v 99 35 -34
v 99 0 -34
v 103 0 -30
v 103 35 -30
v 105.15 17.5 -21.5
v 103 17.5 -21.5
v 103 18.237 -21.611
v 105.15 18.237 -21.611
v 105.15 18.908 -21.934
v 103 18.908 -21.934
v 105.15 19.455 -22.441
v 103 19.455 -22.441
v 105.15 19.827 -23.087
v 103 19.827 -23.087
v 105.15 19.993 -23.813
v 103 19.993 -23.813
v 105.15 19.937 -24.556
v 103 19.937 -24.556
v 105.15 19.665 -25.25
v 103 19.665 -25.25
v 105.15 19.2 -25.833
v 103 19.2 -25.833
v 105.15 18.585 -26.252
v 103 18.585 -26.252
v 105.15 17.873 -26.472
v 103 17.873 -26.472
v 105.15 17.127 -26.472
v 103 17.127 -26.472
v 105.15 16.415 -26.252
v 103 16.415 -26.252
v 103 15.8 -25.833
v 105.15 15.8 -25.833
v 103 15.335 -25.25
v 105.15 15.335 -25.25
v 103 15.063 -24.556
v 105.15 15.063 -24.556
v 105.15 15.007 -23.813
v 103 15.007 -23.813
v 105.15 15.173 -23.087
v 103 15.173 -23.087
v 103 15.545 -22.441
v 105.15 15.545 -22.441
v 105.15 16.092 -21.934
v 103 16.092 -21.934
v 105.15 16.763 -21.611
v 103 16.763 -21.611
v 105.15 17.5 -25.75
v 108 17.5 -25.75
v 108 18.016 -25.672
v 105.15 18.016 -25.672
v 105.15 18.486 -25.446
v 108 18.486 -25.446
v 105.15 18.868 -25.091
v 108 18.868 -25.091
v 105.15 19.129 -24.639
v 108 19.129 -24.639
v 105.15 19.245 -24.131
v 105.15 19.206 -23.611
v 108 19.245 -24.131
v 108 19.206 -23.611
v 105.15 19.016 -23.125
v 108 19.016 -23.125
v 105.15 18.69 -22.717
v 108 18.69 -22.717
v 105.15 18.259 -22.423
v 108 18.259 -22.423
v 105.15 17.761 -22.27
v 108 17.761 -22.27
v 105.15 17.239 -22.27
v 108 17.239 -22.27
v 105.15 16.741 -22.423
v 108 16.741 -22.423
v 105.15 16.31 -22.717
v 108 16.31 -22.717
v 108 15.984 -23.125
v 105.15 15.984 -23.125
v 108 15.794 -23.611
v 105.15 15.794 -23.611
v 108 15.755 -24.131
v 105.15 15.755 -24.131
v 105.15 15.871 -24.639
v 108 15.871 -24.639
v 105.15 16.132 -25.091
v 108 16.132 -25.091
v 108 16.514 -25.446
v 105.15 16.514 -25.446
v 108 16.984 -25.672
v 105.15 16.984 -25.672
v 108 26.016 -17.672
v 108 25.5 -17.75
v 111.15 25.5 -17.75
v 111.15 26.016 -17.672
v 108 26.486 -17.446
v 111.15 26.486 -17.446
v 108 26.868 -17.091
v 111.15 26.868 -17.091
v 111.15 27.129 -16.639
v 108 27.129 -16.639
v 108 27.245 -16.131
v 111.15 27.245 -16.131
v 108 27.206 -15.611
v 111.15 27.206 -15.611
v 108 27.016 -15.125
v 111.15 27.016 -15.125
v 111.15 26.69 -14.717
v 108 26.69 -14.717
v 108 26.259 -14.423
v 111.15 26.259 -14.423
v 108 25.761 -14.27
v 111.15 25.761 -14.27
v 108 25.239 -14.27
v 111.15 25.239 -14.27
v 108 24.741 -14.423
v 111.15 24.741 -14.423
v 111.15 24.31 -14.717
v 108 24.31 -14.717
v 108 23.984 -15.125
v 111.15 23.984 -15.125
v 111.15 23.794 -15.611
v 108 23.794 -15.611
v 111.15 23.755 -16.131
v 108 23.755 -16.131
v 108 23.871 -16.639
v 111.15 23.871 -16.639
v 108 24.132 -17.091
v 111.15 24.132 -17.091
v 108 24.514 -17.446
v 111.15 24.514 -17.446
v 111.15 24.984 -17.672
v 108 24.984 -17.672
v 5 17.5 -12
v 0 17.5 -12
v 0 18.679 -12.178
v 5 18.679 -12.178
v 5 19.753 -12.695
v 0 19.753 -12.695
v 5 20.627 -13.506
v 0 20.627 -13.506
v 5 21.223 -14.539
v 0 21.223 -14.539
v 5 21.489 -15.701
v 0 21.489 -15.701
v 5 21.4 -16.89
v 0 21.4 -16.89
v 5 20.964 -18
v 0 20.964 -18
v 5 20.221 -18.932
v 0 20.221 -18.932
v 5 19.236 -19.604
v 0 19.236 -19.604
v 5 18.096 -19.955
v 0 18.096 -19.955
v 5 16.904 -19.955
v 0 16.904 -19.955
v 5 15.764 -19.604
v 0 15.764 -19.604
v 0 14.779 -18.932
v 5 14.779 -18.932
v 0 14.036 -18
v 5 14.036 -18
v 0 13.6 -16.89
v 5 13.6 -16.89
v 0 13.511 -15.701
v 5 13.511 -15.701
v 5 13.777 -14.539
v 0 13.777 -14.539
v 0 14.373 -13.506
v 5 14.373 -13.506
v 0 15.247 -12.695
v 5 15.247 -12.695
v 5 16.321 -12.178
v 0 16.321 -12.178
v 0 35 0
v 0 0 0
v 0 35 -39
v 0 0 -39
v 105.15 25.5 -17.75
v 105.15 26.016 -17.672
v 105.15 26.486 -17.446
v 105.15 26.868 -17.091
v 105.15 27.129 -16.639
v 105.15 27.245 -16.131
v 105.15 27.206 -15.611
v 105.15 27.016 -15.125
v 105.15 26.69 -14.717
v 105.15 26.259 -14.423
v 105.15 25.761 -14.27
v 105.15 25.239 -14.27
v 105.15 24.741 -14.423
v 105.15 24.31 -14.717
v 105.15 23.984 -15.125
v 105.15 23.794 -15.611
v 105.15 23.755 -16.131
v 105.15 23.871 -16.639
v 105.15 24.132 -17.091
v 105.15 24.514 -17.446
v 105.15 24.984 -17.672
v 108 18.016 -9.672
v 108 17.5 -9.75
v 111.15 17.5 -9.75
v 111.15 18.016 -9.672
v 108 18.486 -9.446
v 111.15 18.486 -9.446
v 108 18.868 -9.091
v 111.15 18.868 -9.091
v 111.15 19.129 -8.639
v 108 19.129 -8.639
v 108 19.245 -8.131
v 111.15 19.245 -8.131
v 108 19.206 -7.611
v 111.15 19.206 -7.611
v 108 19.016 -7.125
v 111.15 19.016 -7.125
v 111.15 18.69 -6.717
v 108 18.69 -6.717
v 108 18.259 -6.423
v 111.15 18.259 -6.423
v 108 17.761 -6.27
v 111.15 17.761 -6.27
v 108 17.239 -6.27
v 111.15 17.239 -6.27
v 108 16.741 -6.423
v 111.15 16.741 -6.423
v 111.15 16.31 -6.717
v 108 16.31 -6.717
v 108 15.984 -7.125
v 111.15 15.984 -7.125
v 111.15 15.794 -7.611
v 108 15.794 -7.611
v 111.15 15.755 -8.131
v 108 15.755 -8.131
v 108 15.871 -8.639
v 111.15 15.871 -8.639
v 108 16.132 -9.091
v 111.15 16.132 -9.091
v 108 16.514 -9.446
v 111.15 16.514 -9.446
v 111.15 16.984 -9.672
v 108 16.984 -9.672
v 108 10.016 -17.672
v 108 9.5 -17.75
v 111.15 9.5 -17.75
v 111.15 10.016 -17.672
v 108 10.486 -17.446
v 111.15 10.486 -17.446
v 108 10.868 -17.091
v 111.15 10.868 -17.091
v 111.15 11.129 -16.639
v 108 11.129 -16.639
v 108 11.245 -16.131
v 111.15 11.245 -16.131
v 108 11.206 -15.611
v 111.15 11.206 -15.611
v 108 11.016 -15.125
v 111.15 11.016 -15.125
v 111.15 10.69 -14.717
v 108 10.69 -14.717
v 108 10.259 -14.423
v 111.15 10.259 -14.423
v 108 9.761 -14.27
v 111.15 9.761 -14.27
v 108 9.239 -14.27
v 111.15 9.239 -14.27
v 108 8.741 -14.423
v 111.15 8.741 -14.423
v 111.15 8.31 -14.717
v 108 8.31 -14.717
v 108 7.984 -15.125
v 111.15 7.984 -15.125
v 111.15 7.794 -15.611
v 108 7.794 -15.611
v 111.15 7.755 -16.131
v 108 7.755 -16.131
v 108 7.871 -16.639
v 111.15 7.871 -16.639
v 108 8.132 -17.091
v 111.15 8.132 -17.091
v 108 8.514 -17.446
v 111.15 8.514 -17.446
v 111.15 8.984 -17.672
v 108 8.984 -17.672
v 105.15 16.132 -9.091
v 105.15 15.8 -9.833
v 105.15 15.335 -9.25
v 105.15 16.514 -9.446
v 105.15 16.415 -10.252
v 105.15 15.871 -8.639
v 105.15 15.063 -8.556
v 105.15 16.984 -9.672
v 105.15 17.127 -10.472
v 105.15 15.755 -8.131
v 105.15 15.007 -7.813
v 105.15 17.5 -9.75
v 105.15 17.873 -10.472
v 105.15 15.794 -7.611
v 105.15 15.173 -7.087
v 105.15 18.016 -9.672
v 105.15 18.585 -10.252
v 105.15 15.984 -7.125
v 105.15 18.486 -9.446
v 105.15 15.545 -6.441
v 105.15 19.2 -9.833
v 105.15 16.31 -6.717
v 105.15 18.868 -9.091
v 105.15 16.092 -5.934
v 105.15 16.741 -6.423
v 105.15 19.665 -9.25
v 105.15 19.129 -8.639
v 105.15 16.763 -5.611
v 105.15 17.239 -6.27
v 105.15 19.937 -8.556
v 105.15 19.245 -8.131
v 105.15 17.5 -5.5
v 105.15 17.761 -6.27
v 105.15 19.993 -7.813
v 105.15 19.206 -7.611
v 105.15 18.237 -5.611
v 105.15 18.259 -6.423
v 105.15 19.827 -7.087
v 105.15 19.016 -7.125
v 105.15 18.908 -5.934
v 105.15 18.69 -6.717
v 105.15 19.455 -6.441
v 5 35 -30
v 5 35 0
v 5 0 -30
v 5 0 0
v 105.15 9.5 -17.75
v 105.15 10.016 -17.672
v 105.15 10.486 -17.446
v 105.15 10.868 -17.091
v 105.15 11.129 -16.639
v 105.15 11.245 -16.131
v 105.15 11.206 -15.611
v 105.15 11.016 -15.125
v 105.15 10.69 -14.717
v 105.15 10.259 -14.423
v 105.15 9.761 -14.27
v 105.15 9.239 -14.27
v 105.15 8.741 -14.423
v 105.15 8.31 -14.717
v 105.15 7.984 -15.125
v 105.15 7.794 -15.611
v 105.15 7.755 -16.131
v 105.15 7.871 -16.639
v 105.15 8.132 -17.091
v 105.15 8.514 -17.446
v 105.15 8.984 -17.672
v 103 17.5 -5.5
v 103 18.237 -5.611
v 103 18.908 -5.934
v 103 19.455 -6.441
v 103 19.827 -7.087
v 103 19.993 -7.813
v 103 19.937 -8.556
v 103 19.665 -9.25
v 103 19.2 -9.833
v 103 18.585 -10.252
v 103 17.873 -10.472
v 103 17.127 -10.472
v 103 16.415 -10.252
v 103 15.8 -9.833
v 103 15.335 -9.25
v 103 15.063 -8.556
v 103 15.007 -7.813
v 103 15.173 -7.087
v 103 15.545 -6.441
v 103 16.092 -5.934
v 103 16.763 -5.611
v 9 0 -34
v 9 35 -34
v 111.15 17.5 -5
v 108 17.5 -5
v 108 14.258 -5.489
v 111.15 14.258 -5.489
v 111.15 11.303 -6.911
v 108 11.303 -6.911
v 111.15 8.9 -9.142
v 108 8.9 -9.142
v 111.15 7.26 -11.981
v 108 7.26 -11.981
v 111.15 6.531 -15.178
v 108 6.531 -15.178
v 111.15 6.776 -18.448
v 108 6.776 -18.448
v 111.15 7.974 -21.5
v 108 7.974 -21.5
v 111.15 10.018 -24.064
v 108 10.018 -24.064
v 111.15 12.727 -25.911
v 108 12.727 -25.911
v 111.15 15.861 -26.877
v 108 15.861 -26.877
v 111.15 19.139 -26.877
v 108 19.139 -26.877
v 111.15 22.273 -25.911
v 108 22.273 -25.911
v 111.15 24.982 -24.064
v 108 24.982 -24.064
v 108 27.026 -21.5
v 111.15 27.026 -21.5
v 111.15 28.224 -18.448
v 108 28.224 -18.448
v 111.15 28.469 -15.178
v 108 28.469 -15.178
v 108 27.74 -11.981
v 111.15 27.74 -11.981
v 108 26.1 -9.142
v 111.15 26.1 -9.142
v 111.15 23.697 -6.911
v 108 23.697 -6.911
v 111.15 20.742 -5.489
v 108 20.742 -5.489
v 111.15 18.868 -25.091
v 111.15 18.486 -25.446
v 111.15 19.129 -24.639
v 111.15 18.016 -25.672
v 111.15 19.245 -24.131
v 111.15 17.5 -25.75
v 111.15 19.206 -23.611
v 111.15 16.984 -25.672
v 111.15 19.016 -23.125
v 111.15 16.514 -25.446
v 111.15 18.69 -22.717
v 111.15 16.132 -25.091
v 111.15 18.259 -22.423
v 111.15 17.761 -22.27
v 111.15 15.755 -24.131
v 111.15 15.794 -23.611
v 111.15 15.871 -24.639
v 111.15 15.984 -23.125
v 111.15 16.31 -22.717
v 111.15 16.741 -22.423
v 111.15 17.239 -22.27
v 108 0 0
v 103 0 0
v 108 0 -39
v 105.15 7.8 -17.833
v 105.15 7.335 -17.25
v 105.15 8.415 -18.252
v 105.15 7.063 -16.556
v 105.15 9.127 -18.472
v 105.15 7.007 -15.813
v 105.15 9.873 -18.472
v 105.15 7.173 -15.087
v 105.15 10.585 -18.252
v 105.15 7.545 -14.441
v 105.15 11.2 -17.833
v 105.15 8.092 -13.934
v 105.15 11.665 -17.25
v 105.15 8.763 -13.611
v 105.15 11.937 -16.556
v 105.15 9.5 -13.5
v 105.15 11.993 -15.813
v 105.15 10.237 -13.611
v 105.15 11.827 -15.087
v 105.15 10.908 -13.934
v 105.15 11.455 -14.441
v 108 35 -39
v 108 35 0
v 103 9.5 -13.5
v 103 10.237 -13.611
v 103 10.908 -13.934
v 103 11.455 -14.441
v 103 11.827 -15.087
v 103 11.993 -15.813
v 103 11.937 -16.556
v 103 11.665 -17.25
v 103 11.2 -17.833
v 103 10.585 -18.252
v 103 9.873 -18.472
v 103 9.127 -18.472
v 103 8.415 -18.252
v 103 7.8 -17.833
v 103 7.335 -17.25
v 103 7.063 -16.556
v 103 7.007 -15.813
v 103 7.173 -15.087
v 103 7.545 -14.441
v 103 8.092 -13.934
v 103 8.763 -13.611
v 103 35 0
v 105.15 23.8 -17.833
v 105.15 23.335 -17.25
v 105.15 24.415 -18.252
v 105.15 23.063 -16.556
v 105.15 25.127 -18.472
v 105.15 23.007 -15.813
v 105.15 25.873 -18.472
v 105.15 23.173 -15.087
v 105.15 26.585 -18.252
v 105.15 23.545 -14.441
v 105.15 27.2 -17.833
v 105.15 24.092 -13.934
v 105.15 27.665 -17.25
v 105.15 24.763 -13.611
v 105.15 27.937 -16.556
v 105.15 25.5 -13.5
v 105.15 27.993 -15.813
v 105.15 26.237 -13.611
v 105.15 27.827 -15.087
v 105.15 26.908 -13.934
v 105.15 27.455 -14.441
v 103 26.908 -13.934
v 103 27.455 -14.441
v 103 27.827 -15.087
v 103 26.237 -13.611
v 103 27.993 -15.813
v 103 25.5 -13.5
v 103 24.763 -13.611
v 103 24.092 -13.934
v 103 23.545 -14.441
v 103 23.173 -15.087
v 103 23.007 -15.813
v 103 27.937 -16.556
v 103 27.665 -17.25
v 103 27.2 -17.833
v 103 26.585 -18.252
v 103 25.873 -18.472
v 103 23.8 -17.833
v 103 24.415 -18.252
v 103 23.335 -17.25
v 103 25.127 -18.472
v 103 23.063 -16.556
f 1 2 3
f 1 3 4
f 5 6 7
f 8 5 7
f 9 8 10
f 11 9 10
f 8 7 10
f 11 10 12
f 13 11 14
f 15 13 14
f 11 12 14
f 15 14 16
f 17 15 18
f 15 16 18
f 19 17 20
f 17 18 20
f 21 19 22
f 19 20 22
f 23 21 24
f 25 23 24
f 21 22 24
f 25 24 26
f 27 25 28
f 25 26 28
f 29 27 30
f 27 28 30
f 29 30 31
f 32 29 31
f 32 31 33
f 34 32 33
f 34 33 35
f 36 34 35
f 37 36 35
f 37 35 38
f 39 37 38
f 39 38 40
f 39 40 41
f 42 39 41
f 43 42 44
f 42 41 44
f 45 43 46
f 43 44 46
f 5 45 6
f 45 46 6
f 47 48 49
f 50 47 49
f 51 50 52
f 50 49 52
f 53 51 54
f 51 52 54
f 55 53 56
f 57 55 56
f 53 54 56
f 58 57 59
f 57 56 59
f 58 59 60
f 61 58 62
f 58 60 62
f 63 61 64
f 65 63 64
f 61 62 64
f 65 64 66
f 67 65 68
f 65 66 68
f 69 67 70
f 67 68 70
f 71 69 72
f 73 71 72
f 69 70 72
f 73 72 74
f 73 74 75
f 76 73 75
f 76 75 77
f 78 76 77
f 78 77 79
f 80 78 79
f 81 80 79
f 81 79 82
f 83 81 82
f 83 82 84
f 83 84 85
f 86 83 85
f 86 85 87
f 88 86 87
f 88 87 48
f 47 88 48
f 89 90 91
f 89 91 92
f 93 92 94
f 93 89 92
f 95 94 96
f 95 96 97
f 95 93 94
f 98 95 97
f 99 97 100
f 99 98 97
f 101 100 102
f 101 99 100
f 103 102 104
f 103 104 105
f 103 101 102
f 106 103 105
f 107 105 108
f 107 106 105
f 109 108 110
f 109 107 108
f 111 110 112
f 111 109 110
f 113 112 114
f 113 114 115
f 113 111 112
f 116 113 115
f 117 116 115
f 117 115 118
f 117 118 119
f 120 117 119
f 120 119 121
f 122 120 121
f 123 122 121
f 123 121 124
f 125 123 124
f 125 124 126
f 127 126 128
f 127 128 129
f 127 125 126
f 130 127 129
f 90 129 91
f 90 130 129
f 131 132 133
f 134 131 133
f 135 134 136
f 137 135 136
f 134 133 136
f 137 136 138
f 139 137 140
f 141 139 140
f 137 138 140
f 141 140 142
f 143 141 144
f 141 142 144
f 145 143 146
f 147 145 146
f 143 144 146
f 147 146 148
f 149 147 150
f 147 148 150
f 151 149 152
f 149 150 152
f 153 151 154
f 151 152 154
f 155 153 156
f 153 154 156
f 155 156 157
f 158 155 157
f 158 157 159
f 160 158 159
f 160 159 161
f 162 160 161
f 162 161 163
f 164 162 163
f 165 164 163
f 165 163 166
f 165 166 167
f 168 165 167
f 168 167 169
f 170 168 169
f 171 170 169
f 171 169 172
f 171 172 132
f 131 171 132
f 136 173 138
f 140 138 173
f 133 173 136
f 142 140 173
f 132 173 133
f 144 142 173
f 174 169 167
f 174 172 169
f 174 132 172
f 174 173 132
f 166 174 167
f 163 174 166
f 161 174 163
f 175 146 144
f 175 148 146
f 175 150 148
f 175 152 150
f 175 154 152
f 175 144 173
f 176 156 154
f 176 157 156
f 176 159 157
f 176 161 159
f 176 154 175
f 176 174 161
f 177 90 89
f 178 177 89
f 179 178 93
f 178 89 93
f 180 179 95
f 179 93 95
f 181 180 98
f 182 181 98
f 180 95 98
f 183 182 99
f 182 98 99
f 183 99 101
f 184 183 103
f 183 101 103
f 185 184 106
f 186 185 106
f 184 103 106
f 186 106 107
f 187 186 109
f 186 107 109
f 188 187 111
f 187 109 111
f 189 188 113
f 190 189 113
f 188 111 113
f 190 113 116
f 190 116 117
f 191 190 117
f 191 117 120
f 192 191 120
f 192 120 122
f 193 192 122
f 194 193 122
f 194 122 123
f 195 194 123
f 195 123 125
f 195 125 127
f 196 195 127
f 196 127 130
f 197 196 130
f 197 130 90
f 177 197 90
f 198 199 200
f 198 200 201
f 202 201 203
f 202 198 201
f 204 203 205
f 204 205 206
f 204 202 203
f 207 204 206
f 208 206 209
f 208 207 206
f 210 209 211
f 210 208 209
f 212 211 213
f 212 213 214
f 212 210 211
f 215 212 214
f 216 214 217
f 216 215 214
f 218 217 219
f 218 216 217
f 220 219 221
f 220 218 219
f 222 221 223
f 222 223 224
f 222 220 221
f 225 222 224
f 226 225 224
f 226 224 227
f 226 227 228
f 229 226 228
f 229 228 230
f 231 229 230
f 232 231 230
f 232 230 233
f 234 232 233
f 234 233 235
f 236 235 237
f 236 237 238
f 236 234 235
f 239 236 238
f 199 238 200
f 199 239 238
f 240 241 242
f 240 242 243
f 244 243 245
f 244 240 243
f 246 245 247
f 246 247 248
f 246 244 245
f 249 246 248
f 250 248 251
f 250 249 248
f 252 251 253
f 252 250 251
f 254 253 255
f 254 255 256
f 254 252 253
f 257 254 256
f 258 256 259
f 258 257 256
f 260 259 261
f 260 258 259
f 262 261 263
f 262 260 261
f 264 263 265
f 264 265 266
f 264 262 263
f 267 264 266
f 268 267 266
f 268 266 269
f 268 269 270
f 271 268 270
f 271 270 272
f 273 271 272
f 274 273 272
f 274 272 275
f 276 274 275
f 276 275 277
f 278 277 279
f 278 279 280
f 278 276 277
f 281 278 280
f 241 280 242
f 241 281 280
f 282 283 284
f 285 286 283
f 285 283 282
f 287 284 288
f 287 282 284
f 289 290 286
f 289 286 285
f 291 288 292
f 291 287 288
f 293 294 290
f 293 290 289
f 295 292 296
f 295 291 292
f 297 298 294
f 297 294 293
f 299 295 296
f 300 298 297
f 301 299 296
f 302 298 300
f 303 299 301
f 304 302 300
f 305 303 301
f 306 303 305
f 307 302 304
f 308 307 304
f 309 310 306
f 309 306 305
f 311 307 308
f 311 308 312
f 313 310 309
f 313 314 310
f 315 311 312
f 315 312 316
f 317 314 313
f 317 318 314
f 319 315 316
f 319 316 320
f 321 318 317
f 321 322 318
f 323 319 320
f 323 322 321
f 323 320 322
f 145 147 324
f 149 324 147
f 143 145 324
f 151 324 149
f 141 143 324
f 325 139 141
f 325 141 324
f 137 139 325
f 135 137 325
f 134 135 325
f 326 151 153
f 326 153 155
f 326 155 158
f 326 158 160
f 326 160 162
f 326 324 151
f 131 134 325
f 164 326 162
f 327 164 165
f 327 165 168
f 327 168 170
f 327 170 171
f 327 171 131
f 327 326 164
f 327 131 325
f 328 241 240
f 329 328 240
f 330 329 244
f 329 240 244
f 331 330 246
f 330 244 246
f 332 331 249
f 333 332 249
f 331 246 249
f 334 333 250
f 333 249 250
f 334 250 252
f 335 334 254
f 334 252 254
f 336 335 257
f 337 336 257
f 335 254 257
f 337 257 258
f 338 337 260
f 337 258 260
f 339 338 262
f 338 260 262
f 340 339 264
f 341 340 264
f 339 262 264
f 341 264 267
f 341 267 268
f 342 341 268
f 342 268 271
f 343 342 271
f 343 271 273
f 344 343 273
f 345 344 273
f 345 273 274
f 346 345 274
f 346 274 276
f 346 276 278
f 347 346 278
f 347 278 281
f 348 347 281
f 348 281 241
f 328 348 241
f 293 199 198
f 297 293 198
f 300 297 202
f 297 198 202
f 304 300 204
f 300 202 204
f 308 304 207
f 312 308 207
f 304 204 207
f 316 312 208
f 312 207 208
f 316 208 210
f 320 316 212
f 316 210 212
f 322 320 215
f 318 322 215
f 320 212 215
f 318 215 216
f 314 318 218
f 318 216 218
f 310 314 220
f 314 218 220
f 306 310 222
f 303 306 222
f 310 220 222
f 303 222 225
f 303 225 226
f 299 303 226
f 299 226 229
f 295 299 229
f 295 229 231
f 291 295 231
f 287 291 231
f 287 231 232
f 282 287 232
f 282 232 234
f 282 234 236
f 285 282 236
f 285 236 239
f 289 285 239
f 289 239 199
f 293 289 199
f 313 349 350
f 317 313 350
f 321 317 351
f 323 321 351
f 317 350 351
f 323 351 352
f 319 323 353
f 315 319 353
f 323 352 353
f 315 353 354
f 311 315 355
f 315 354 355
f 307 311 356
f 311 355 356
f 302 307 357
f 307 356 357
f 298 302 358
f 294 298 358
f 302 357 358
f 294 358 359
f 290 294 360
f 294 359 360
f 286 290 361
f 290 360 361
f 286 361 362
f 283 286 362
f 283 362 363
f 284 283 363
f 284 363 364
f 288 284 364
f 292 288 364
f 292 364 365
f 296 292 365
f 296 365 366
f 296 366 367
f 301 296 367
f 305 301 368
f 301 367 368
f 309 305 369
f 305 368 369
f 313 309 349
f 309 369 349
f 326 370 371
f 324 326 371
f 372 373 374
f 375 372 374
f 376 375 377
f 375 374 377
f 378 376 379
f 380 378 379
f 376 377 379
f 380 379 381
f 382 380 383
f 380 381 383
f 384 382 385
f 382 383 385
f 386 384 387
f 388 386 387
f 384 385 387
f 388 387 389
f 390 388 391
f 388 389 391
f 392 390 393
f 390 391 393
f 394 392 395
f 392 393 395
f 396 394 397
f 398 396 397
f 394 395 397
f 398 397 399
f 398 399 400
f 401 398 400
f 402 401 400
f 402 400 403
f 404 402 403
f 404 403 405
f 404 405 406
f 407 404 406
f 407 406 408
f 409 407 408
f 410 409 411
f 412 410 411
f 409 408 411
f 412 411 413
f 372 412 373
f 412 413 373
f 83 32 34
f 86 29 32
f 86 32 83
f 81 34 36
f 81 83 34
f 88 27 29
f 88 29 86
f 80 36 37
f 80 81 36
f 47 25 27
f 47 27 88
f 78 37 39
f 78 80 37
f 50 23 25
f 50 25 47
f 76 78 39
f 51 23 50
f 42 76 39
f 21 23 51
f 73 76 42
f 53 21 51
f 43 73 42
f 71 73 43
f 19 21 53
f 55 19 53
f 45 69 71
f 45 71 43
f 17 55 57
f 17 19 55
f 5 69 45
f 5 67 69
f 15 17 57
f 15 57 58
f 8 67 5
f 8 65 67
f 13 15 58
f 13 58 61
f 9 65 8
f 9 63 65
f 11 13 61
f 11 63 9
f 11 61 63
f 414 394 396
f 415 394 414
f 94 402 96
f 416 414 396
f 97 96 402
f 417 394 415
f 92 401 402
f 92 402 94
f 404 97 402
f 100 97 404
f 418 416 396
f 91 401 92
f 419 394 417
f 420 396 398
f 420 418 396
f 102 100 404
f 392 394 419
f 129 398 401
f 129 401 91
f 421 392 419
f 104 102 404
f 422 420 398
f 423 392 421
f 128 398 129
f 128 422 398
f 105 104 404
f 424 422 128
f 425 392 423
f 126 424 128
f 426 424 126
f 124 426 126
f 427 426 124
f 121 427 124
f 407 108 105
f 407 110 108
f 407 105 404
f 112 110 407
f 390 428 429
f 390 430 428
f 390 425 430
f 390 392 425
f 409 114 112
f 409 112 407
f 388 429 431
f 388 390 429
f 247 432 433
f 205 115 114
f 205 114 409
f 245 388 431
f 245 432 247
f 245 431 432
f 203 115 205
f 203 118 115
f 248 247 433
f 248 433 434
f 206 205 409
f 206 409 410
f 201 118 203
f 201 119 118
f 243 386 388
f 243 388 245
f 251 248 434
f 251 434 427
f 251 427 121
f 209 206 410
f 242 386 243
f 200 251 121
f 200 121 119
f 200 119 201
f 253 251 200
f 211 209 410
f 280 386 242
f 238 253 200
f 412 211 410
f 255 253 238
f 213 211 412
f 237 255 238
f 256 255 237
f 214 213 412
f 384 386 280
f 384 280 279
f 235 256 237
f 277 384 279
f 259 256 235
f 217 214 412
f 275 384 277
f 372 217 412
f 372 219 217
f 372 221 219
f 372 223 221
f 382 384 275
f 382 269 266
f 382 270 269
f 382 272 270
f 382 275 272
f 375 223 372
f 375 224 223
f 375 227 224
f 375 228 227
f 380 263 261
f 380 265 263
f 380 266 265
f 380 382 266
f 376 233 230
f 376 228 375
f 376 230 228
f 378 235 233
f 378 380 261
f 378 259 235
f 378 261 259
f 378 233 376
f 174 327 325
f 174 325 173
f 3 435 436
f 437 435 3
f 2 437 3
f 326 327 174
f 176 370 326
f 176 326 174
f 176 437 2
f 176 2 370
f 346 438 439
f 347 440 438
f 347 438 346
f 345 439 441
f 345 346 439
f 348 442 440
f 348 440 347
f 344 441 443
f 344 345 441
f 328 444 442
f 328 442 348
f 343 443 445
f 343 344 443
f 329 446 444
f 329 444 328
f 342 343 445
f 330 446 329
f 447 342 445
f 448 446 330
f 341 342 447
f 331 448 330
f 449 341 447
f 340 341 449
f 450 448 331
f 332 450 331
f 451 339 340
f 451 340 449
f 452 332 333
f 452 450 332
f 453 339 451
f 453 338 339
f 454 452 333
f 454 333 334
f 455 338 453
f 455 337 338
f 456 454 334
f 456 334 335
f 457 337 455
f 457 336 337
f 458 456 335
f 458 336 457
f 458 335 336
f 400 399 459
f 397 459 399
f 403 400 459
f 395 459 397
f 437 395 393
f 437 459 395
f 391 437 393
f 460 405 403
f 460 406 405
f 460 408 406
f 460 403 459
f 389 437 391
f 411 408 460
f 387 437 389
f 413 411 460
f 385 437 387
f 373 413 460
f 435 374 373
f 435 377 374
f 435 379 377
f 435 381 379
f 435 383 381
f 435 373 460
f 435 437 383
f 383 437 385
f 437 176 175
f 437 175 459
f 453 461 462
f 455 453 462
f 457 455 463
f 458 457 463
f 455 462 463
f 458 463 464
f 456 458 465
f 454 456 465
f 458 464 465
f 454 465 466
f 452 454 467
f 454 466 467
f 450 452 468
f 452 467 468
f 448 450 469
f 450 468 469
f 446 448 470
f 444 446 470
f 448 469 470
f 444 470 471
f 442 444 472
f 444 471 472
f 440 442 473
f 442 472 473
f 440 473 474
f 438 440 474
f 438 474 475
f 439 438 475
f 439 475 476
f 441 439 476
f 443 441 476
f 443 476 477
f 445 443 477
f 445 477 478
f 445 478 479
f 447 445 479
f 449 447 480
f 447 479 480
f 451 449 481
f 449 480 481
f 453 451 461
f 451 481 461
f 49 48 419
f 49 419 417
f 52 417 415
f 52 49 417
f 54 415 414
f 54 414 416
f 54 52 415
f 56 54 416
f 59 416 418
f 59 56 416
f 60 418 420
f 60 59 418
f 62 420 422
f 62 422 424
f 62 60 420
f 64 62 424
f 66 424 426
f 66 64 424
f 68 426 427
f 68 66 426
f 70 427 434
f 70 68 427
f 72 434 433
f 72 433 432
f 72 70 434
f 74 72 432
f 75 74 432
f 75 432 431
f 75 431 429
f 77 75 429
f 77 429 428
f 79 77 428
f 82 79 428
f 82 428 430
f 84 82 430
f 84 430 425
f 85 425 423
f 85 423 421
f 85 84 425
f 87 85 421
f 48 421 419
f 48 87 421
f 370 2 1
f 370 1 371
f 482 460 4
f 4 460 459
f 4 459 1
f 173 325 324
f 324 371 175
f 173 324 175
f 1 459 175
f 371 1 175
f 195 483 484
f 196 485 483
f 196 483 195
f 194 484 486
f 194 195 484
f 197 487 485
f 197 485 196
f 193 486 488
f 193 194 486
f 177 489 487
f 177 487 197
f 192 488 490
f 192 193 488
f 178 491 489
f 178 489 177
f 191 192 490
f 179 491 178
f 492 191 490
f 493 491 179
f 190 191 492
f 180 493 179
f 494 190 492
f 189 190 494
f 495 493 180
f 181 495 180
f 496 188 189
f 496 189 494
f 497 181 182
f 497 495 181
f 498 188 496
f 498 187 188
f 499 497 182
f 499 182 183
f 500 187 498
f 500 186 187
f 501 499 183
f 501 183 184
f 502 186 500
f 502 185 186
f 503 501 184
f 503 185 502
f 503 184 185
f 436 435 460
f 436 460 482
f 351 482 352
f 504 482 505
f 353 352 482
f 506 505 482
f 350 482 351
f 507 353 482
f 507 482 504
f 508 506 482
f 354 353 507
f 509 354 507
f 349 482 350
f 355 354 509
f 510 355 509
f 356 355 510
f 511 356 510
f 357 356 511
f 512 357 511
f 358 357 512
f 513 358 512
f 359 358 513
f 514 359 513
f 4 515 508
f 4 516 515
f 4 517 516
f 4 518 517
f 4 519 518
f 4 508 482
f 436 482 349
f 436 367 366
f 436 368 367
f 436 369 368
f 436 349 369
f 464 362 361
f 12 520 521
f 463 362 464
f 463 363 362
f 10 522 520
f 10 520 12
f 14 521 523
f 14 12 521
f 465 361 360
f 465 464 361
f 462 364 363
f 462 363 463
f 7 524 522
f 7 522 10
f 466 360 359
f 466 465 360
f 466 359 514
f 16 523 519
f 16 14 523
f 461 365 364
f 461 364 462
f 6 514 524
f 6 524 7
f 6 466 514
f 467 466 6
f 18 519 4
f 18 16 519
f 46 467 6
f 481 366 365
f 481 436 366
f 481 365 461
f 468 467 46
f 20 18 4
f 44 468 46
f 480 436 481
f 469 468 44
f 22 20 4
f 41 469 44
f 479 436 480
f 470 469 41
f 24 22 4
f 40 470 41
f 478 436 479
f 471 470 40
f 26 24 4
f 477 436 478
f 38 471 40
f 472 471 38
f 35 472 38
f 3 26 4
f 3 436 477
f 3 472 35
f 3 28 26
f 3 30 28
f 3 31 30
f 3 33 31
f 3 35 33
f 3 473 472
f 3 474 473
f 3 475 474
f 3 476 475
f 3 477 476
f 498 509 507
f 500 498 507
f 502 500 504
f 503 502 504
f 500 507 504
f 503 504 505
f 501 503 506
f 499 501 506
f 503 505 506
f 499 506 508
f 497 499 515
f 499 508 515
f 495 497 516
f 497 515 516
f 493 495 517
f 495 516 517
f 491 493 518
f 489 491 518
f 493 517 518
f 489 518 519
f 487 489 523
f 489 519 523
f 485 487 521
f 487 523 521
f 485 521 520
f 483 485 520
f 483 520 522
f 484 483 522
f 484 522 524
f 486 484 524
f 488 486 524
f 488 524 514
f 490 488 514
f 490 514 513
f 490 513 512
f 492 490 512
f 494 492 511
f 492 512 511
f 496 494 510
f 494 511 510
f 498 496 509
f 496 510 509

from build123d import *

# Parameters (mm, degrees)
BOSS_EXTRUDE2_DEPTH = 35
SKETCH3_R           = 11
SKETCH3_R_2         = 1.75
BOSS_EXTRUDE5_DEPTH = 3.15
CUT_EXTRUDE2_REACH  = 122.042
SKETCH5_R           = 1.75
SKETCH6_R           = 2.5
CUT_EXTRUDE3_DEPTH  = 2.15
CUT_EXTRUDE4_REACH  = 124.883
SKETCH7_R           = 4
CHAMFER1_SIZE       = 4


with BuildPart() as part:
    # Sketch1 → Boss-Extrude2 (new body)
    with BuildSketch(Plane(origin=(0, 0, 0), x_dir=(1, 0, 0), z_dir=(0, 1, 0))):
        Polygon((0, 0), (0, 39), (108, 39), (108, 0), (103, 0), (103, 34), (5, 34), (5, 0), align=None)
    extrude(amount=BOSS_EXTRUDE2_DEPTH)

    # Sketch3 → Boss-Extrude5 (add)
    with BuildSketch(Plane(origin=(108, 0, 0), x_dir=(0, 0, -1), z_dir=(1, 0, 0))):
        with Locations(Location((16, 17.5, 0), (0, 0, 180))):
            Circle(SKETCH3_R)
        with Locations((16, 9.5)):
            Circle(SKETCH3_R_2, mode=Mode.SUBTRACT)
        with Locations((8, 17.5)):
            Circle(SKETCH3_R_2, mode=Mode.SUBTRACT)
        with Locations((16, 25.5)):
            Circle(SKETCH3_R_2, mode=Mode.SUBTRACT)
        with Locations((24, 17.5)):
            Circle(SKETCH3_R_2, mode=Mode.SUBTRACT)
    extrude(amount=BOSS_EXTRUDE5_DEPTH)

    # Sketch5 → Cut-Extrude2 (cut, up to next)
    with BuildSketch(Plane(origin=(108, 0, 0), x_dir=(0, 0, -1), z_dir=(1, 0, 0)), mode=Mode.PRIVATE) as cut_extrude2_sk1:
        with Locations((16, 9.5)):
            Circle(SKETCH5_R)
    cut_extrude2_tool1 = extrude(cut_extrude2_sk1.sketch, amount=-CUT_EXTRUDE2_REACH, mode=Mode.PRIVATE) & part.part
    # Sketch5 → Cut-Extrude2 (cut, up to next)
    with BuildSketch(Plane(origin=(108, 0, 0), x_dir=(0, 0, -1), z_dir=(1, 0, 0)), mode=Mode.PRIVATE) as cut_extrude2_sk2:
        with Locations((24, 17.5)):
            Circle(SKETCH5_R)
    cut_extrude2_tool2 = extrude(cut_extrude2_sk2.sketch, amount=-CUT_EXTRUDE2_REACH, mode=Mode.PRIVATE) & part.part
    # Sketch5 → Cut-Extrude2 (cut, up to next)
    with BuildSketch(Plane(origin=(108, 0, 0), x_dir=(0, 0, -1), z_dir=(1, 0, 0)), mode=Mode.PRIVATE) as cut_extrude2_sk3:
        with Locations((16, 25.5)):
            Circle(SKETCH5_R)
    cut_extrude2_tool3 = extrude(cut_extrude2_sk3.sketch, amount=-CUT_EXTRUDE2_REACH, mode=Mode.PRIVATE) & part.part
    # Sketch5 → Cut-Extrude2 (cut, up to next)
    with BuildSketch(Plane(origin=(108, 0, 0), x_dir=(0, 0, -1), z_dir=(1, 0, 0)), mode=Mode.PRIVATE) as cut_extrude2_sk4:
        with Locations((8, 17.5)):
            Circle(SKETCH5_R)
    cut_extrude2_tool4 = extrude(cut_extrude2_sk4.sketch, amount=-CUT_EXTRUDE2_REACH, mode=Mode.PRIVATE) & part.part
    add(cut_extrude2_tool1.solids().sort_by_distance((108, 9.5, -16))[0], mode=Mode.SUBTRACT)
    add(cut_extrude2_tool2.solids().sort_by_distance((108, 17.5, -24))[0], mode=Mode.SUBTRACT)
    add(cut_extrude2_tool3.solids().sort_by_distance((108, 25.5, -16))[0], mode=Mode.SUBTRACT)
    add(cut_extrude2_tool4.solids().sort_by_distance((108, 17.5, -8))[0], mode=Mode.SUBTRACT)

    # Sketch6 → Cut-Extrude3 (cut)
    with BuildSketch(Plane.ZY.offset(-103)):
        with Locations((-16, 9.5)):
            Circle(SKETCH6_R)
        with Locations((-24, 17.5)):
            Circle(SKETCH6_R)
        with Locations((-16, 25.5)):
            Circle(SKETCH6_R)
        with Locations((-8, 17.5)):
            Circle(SKETCH6_R)
    extrude(amount=-CUT_EXTRUDE3_DEPTH, mode=Mode.SUBTRACT)

    # Sketch7 → Cut-Extrude4 (cut, up to next)
    with BuildSketch(Plane.ZY, mode=Mode.PRIVATE) as cut_extrude4_sk1:
        with Locations((-16, 17.5)):
            Circle(SKETCH7_R)
    cut_extrude4_tool1 = extrude(cut_extrude4_sk1.sketch, amount=-CUT_EXTRUDE4_REACH, mode=Mode.PRIVATE) & part.part
    add(cut_extrude4_tool1.solids().sort_by_distance((0, 17.5, -16))[0], mode=Mode.SUBTRACT)

    # Chamfer1
    chamfer1_edges = [part.edges().sort_by_distance(p)[0] for p in [
        (103, 17.5, -34),
        (5, 17.5, -34),
    ]]
    chamfer(chamfer1_edges, length=CHAMFER1_SIZE)


solid = part.part
